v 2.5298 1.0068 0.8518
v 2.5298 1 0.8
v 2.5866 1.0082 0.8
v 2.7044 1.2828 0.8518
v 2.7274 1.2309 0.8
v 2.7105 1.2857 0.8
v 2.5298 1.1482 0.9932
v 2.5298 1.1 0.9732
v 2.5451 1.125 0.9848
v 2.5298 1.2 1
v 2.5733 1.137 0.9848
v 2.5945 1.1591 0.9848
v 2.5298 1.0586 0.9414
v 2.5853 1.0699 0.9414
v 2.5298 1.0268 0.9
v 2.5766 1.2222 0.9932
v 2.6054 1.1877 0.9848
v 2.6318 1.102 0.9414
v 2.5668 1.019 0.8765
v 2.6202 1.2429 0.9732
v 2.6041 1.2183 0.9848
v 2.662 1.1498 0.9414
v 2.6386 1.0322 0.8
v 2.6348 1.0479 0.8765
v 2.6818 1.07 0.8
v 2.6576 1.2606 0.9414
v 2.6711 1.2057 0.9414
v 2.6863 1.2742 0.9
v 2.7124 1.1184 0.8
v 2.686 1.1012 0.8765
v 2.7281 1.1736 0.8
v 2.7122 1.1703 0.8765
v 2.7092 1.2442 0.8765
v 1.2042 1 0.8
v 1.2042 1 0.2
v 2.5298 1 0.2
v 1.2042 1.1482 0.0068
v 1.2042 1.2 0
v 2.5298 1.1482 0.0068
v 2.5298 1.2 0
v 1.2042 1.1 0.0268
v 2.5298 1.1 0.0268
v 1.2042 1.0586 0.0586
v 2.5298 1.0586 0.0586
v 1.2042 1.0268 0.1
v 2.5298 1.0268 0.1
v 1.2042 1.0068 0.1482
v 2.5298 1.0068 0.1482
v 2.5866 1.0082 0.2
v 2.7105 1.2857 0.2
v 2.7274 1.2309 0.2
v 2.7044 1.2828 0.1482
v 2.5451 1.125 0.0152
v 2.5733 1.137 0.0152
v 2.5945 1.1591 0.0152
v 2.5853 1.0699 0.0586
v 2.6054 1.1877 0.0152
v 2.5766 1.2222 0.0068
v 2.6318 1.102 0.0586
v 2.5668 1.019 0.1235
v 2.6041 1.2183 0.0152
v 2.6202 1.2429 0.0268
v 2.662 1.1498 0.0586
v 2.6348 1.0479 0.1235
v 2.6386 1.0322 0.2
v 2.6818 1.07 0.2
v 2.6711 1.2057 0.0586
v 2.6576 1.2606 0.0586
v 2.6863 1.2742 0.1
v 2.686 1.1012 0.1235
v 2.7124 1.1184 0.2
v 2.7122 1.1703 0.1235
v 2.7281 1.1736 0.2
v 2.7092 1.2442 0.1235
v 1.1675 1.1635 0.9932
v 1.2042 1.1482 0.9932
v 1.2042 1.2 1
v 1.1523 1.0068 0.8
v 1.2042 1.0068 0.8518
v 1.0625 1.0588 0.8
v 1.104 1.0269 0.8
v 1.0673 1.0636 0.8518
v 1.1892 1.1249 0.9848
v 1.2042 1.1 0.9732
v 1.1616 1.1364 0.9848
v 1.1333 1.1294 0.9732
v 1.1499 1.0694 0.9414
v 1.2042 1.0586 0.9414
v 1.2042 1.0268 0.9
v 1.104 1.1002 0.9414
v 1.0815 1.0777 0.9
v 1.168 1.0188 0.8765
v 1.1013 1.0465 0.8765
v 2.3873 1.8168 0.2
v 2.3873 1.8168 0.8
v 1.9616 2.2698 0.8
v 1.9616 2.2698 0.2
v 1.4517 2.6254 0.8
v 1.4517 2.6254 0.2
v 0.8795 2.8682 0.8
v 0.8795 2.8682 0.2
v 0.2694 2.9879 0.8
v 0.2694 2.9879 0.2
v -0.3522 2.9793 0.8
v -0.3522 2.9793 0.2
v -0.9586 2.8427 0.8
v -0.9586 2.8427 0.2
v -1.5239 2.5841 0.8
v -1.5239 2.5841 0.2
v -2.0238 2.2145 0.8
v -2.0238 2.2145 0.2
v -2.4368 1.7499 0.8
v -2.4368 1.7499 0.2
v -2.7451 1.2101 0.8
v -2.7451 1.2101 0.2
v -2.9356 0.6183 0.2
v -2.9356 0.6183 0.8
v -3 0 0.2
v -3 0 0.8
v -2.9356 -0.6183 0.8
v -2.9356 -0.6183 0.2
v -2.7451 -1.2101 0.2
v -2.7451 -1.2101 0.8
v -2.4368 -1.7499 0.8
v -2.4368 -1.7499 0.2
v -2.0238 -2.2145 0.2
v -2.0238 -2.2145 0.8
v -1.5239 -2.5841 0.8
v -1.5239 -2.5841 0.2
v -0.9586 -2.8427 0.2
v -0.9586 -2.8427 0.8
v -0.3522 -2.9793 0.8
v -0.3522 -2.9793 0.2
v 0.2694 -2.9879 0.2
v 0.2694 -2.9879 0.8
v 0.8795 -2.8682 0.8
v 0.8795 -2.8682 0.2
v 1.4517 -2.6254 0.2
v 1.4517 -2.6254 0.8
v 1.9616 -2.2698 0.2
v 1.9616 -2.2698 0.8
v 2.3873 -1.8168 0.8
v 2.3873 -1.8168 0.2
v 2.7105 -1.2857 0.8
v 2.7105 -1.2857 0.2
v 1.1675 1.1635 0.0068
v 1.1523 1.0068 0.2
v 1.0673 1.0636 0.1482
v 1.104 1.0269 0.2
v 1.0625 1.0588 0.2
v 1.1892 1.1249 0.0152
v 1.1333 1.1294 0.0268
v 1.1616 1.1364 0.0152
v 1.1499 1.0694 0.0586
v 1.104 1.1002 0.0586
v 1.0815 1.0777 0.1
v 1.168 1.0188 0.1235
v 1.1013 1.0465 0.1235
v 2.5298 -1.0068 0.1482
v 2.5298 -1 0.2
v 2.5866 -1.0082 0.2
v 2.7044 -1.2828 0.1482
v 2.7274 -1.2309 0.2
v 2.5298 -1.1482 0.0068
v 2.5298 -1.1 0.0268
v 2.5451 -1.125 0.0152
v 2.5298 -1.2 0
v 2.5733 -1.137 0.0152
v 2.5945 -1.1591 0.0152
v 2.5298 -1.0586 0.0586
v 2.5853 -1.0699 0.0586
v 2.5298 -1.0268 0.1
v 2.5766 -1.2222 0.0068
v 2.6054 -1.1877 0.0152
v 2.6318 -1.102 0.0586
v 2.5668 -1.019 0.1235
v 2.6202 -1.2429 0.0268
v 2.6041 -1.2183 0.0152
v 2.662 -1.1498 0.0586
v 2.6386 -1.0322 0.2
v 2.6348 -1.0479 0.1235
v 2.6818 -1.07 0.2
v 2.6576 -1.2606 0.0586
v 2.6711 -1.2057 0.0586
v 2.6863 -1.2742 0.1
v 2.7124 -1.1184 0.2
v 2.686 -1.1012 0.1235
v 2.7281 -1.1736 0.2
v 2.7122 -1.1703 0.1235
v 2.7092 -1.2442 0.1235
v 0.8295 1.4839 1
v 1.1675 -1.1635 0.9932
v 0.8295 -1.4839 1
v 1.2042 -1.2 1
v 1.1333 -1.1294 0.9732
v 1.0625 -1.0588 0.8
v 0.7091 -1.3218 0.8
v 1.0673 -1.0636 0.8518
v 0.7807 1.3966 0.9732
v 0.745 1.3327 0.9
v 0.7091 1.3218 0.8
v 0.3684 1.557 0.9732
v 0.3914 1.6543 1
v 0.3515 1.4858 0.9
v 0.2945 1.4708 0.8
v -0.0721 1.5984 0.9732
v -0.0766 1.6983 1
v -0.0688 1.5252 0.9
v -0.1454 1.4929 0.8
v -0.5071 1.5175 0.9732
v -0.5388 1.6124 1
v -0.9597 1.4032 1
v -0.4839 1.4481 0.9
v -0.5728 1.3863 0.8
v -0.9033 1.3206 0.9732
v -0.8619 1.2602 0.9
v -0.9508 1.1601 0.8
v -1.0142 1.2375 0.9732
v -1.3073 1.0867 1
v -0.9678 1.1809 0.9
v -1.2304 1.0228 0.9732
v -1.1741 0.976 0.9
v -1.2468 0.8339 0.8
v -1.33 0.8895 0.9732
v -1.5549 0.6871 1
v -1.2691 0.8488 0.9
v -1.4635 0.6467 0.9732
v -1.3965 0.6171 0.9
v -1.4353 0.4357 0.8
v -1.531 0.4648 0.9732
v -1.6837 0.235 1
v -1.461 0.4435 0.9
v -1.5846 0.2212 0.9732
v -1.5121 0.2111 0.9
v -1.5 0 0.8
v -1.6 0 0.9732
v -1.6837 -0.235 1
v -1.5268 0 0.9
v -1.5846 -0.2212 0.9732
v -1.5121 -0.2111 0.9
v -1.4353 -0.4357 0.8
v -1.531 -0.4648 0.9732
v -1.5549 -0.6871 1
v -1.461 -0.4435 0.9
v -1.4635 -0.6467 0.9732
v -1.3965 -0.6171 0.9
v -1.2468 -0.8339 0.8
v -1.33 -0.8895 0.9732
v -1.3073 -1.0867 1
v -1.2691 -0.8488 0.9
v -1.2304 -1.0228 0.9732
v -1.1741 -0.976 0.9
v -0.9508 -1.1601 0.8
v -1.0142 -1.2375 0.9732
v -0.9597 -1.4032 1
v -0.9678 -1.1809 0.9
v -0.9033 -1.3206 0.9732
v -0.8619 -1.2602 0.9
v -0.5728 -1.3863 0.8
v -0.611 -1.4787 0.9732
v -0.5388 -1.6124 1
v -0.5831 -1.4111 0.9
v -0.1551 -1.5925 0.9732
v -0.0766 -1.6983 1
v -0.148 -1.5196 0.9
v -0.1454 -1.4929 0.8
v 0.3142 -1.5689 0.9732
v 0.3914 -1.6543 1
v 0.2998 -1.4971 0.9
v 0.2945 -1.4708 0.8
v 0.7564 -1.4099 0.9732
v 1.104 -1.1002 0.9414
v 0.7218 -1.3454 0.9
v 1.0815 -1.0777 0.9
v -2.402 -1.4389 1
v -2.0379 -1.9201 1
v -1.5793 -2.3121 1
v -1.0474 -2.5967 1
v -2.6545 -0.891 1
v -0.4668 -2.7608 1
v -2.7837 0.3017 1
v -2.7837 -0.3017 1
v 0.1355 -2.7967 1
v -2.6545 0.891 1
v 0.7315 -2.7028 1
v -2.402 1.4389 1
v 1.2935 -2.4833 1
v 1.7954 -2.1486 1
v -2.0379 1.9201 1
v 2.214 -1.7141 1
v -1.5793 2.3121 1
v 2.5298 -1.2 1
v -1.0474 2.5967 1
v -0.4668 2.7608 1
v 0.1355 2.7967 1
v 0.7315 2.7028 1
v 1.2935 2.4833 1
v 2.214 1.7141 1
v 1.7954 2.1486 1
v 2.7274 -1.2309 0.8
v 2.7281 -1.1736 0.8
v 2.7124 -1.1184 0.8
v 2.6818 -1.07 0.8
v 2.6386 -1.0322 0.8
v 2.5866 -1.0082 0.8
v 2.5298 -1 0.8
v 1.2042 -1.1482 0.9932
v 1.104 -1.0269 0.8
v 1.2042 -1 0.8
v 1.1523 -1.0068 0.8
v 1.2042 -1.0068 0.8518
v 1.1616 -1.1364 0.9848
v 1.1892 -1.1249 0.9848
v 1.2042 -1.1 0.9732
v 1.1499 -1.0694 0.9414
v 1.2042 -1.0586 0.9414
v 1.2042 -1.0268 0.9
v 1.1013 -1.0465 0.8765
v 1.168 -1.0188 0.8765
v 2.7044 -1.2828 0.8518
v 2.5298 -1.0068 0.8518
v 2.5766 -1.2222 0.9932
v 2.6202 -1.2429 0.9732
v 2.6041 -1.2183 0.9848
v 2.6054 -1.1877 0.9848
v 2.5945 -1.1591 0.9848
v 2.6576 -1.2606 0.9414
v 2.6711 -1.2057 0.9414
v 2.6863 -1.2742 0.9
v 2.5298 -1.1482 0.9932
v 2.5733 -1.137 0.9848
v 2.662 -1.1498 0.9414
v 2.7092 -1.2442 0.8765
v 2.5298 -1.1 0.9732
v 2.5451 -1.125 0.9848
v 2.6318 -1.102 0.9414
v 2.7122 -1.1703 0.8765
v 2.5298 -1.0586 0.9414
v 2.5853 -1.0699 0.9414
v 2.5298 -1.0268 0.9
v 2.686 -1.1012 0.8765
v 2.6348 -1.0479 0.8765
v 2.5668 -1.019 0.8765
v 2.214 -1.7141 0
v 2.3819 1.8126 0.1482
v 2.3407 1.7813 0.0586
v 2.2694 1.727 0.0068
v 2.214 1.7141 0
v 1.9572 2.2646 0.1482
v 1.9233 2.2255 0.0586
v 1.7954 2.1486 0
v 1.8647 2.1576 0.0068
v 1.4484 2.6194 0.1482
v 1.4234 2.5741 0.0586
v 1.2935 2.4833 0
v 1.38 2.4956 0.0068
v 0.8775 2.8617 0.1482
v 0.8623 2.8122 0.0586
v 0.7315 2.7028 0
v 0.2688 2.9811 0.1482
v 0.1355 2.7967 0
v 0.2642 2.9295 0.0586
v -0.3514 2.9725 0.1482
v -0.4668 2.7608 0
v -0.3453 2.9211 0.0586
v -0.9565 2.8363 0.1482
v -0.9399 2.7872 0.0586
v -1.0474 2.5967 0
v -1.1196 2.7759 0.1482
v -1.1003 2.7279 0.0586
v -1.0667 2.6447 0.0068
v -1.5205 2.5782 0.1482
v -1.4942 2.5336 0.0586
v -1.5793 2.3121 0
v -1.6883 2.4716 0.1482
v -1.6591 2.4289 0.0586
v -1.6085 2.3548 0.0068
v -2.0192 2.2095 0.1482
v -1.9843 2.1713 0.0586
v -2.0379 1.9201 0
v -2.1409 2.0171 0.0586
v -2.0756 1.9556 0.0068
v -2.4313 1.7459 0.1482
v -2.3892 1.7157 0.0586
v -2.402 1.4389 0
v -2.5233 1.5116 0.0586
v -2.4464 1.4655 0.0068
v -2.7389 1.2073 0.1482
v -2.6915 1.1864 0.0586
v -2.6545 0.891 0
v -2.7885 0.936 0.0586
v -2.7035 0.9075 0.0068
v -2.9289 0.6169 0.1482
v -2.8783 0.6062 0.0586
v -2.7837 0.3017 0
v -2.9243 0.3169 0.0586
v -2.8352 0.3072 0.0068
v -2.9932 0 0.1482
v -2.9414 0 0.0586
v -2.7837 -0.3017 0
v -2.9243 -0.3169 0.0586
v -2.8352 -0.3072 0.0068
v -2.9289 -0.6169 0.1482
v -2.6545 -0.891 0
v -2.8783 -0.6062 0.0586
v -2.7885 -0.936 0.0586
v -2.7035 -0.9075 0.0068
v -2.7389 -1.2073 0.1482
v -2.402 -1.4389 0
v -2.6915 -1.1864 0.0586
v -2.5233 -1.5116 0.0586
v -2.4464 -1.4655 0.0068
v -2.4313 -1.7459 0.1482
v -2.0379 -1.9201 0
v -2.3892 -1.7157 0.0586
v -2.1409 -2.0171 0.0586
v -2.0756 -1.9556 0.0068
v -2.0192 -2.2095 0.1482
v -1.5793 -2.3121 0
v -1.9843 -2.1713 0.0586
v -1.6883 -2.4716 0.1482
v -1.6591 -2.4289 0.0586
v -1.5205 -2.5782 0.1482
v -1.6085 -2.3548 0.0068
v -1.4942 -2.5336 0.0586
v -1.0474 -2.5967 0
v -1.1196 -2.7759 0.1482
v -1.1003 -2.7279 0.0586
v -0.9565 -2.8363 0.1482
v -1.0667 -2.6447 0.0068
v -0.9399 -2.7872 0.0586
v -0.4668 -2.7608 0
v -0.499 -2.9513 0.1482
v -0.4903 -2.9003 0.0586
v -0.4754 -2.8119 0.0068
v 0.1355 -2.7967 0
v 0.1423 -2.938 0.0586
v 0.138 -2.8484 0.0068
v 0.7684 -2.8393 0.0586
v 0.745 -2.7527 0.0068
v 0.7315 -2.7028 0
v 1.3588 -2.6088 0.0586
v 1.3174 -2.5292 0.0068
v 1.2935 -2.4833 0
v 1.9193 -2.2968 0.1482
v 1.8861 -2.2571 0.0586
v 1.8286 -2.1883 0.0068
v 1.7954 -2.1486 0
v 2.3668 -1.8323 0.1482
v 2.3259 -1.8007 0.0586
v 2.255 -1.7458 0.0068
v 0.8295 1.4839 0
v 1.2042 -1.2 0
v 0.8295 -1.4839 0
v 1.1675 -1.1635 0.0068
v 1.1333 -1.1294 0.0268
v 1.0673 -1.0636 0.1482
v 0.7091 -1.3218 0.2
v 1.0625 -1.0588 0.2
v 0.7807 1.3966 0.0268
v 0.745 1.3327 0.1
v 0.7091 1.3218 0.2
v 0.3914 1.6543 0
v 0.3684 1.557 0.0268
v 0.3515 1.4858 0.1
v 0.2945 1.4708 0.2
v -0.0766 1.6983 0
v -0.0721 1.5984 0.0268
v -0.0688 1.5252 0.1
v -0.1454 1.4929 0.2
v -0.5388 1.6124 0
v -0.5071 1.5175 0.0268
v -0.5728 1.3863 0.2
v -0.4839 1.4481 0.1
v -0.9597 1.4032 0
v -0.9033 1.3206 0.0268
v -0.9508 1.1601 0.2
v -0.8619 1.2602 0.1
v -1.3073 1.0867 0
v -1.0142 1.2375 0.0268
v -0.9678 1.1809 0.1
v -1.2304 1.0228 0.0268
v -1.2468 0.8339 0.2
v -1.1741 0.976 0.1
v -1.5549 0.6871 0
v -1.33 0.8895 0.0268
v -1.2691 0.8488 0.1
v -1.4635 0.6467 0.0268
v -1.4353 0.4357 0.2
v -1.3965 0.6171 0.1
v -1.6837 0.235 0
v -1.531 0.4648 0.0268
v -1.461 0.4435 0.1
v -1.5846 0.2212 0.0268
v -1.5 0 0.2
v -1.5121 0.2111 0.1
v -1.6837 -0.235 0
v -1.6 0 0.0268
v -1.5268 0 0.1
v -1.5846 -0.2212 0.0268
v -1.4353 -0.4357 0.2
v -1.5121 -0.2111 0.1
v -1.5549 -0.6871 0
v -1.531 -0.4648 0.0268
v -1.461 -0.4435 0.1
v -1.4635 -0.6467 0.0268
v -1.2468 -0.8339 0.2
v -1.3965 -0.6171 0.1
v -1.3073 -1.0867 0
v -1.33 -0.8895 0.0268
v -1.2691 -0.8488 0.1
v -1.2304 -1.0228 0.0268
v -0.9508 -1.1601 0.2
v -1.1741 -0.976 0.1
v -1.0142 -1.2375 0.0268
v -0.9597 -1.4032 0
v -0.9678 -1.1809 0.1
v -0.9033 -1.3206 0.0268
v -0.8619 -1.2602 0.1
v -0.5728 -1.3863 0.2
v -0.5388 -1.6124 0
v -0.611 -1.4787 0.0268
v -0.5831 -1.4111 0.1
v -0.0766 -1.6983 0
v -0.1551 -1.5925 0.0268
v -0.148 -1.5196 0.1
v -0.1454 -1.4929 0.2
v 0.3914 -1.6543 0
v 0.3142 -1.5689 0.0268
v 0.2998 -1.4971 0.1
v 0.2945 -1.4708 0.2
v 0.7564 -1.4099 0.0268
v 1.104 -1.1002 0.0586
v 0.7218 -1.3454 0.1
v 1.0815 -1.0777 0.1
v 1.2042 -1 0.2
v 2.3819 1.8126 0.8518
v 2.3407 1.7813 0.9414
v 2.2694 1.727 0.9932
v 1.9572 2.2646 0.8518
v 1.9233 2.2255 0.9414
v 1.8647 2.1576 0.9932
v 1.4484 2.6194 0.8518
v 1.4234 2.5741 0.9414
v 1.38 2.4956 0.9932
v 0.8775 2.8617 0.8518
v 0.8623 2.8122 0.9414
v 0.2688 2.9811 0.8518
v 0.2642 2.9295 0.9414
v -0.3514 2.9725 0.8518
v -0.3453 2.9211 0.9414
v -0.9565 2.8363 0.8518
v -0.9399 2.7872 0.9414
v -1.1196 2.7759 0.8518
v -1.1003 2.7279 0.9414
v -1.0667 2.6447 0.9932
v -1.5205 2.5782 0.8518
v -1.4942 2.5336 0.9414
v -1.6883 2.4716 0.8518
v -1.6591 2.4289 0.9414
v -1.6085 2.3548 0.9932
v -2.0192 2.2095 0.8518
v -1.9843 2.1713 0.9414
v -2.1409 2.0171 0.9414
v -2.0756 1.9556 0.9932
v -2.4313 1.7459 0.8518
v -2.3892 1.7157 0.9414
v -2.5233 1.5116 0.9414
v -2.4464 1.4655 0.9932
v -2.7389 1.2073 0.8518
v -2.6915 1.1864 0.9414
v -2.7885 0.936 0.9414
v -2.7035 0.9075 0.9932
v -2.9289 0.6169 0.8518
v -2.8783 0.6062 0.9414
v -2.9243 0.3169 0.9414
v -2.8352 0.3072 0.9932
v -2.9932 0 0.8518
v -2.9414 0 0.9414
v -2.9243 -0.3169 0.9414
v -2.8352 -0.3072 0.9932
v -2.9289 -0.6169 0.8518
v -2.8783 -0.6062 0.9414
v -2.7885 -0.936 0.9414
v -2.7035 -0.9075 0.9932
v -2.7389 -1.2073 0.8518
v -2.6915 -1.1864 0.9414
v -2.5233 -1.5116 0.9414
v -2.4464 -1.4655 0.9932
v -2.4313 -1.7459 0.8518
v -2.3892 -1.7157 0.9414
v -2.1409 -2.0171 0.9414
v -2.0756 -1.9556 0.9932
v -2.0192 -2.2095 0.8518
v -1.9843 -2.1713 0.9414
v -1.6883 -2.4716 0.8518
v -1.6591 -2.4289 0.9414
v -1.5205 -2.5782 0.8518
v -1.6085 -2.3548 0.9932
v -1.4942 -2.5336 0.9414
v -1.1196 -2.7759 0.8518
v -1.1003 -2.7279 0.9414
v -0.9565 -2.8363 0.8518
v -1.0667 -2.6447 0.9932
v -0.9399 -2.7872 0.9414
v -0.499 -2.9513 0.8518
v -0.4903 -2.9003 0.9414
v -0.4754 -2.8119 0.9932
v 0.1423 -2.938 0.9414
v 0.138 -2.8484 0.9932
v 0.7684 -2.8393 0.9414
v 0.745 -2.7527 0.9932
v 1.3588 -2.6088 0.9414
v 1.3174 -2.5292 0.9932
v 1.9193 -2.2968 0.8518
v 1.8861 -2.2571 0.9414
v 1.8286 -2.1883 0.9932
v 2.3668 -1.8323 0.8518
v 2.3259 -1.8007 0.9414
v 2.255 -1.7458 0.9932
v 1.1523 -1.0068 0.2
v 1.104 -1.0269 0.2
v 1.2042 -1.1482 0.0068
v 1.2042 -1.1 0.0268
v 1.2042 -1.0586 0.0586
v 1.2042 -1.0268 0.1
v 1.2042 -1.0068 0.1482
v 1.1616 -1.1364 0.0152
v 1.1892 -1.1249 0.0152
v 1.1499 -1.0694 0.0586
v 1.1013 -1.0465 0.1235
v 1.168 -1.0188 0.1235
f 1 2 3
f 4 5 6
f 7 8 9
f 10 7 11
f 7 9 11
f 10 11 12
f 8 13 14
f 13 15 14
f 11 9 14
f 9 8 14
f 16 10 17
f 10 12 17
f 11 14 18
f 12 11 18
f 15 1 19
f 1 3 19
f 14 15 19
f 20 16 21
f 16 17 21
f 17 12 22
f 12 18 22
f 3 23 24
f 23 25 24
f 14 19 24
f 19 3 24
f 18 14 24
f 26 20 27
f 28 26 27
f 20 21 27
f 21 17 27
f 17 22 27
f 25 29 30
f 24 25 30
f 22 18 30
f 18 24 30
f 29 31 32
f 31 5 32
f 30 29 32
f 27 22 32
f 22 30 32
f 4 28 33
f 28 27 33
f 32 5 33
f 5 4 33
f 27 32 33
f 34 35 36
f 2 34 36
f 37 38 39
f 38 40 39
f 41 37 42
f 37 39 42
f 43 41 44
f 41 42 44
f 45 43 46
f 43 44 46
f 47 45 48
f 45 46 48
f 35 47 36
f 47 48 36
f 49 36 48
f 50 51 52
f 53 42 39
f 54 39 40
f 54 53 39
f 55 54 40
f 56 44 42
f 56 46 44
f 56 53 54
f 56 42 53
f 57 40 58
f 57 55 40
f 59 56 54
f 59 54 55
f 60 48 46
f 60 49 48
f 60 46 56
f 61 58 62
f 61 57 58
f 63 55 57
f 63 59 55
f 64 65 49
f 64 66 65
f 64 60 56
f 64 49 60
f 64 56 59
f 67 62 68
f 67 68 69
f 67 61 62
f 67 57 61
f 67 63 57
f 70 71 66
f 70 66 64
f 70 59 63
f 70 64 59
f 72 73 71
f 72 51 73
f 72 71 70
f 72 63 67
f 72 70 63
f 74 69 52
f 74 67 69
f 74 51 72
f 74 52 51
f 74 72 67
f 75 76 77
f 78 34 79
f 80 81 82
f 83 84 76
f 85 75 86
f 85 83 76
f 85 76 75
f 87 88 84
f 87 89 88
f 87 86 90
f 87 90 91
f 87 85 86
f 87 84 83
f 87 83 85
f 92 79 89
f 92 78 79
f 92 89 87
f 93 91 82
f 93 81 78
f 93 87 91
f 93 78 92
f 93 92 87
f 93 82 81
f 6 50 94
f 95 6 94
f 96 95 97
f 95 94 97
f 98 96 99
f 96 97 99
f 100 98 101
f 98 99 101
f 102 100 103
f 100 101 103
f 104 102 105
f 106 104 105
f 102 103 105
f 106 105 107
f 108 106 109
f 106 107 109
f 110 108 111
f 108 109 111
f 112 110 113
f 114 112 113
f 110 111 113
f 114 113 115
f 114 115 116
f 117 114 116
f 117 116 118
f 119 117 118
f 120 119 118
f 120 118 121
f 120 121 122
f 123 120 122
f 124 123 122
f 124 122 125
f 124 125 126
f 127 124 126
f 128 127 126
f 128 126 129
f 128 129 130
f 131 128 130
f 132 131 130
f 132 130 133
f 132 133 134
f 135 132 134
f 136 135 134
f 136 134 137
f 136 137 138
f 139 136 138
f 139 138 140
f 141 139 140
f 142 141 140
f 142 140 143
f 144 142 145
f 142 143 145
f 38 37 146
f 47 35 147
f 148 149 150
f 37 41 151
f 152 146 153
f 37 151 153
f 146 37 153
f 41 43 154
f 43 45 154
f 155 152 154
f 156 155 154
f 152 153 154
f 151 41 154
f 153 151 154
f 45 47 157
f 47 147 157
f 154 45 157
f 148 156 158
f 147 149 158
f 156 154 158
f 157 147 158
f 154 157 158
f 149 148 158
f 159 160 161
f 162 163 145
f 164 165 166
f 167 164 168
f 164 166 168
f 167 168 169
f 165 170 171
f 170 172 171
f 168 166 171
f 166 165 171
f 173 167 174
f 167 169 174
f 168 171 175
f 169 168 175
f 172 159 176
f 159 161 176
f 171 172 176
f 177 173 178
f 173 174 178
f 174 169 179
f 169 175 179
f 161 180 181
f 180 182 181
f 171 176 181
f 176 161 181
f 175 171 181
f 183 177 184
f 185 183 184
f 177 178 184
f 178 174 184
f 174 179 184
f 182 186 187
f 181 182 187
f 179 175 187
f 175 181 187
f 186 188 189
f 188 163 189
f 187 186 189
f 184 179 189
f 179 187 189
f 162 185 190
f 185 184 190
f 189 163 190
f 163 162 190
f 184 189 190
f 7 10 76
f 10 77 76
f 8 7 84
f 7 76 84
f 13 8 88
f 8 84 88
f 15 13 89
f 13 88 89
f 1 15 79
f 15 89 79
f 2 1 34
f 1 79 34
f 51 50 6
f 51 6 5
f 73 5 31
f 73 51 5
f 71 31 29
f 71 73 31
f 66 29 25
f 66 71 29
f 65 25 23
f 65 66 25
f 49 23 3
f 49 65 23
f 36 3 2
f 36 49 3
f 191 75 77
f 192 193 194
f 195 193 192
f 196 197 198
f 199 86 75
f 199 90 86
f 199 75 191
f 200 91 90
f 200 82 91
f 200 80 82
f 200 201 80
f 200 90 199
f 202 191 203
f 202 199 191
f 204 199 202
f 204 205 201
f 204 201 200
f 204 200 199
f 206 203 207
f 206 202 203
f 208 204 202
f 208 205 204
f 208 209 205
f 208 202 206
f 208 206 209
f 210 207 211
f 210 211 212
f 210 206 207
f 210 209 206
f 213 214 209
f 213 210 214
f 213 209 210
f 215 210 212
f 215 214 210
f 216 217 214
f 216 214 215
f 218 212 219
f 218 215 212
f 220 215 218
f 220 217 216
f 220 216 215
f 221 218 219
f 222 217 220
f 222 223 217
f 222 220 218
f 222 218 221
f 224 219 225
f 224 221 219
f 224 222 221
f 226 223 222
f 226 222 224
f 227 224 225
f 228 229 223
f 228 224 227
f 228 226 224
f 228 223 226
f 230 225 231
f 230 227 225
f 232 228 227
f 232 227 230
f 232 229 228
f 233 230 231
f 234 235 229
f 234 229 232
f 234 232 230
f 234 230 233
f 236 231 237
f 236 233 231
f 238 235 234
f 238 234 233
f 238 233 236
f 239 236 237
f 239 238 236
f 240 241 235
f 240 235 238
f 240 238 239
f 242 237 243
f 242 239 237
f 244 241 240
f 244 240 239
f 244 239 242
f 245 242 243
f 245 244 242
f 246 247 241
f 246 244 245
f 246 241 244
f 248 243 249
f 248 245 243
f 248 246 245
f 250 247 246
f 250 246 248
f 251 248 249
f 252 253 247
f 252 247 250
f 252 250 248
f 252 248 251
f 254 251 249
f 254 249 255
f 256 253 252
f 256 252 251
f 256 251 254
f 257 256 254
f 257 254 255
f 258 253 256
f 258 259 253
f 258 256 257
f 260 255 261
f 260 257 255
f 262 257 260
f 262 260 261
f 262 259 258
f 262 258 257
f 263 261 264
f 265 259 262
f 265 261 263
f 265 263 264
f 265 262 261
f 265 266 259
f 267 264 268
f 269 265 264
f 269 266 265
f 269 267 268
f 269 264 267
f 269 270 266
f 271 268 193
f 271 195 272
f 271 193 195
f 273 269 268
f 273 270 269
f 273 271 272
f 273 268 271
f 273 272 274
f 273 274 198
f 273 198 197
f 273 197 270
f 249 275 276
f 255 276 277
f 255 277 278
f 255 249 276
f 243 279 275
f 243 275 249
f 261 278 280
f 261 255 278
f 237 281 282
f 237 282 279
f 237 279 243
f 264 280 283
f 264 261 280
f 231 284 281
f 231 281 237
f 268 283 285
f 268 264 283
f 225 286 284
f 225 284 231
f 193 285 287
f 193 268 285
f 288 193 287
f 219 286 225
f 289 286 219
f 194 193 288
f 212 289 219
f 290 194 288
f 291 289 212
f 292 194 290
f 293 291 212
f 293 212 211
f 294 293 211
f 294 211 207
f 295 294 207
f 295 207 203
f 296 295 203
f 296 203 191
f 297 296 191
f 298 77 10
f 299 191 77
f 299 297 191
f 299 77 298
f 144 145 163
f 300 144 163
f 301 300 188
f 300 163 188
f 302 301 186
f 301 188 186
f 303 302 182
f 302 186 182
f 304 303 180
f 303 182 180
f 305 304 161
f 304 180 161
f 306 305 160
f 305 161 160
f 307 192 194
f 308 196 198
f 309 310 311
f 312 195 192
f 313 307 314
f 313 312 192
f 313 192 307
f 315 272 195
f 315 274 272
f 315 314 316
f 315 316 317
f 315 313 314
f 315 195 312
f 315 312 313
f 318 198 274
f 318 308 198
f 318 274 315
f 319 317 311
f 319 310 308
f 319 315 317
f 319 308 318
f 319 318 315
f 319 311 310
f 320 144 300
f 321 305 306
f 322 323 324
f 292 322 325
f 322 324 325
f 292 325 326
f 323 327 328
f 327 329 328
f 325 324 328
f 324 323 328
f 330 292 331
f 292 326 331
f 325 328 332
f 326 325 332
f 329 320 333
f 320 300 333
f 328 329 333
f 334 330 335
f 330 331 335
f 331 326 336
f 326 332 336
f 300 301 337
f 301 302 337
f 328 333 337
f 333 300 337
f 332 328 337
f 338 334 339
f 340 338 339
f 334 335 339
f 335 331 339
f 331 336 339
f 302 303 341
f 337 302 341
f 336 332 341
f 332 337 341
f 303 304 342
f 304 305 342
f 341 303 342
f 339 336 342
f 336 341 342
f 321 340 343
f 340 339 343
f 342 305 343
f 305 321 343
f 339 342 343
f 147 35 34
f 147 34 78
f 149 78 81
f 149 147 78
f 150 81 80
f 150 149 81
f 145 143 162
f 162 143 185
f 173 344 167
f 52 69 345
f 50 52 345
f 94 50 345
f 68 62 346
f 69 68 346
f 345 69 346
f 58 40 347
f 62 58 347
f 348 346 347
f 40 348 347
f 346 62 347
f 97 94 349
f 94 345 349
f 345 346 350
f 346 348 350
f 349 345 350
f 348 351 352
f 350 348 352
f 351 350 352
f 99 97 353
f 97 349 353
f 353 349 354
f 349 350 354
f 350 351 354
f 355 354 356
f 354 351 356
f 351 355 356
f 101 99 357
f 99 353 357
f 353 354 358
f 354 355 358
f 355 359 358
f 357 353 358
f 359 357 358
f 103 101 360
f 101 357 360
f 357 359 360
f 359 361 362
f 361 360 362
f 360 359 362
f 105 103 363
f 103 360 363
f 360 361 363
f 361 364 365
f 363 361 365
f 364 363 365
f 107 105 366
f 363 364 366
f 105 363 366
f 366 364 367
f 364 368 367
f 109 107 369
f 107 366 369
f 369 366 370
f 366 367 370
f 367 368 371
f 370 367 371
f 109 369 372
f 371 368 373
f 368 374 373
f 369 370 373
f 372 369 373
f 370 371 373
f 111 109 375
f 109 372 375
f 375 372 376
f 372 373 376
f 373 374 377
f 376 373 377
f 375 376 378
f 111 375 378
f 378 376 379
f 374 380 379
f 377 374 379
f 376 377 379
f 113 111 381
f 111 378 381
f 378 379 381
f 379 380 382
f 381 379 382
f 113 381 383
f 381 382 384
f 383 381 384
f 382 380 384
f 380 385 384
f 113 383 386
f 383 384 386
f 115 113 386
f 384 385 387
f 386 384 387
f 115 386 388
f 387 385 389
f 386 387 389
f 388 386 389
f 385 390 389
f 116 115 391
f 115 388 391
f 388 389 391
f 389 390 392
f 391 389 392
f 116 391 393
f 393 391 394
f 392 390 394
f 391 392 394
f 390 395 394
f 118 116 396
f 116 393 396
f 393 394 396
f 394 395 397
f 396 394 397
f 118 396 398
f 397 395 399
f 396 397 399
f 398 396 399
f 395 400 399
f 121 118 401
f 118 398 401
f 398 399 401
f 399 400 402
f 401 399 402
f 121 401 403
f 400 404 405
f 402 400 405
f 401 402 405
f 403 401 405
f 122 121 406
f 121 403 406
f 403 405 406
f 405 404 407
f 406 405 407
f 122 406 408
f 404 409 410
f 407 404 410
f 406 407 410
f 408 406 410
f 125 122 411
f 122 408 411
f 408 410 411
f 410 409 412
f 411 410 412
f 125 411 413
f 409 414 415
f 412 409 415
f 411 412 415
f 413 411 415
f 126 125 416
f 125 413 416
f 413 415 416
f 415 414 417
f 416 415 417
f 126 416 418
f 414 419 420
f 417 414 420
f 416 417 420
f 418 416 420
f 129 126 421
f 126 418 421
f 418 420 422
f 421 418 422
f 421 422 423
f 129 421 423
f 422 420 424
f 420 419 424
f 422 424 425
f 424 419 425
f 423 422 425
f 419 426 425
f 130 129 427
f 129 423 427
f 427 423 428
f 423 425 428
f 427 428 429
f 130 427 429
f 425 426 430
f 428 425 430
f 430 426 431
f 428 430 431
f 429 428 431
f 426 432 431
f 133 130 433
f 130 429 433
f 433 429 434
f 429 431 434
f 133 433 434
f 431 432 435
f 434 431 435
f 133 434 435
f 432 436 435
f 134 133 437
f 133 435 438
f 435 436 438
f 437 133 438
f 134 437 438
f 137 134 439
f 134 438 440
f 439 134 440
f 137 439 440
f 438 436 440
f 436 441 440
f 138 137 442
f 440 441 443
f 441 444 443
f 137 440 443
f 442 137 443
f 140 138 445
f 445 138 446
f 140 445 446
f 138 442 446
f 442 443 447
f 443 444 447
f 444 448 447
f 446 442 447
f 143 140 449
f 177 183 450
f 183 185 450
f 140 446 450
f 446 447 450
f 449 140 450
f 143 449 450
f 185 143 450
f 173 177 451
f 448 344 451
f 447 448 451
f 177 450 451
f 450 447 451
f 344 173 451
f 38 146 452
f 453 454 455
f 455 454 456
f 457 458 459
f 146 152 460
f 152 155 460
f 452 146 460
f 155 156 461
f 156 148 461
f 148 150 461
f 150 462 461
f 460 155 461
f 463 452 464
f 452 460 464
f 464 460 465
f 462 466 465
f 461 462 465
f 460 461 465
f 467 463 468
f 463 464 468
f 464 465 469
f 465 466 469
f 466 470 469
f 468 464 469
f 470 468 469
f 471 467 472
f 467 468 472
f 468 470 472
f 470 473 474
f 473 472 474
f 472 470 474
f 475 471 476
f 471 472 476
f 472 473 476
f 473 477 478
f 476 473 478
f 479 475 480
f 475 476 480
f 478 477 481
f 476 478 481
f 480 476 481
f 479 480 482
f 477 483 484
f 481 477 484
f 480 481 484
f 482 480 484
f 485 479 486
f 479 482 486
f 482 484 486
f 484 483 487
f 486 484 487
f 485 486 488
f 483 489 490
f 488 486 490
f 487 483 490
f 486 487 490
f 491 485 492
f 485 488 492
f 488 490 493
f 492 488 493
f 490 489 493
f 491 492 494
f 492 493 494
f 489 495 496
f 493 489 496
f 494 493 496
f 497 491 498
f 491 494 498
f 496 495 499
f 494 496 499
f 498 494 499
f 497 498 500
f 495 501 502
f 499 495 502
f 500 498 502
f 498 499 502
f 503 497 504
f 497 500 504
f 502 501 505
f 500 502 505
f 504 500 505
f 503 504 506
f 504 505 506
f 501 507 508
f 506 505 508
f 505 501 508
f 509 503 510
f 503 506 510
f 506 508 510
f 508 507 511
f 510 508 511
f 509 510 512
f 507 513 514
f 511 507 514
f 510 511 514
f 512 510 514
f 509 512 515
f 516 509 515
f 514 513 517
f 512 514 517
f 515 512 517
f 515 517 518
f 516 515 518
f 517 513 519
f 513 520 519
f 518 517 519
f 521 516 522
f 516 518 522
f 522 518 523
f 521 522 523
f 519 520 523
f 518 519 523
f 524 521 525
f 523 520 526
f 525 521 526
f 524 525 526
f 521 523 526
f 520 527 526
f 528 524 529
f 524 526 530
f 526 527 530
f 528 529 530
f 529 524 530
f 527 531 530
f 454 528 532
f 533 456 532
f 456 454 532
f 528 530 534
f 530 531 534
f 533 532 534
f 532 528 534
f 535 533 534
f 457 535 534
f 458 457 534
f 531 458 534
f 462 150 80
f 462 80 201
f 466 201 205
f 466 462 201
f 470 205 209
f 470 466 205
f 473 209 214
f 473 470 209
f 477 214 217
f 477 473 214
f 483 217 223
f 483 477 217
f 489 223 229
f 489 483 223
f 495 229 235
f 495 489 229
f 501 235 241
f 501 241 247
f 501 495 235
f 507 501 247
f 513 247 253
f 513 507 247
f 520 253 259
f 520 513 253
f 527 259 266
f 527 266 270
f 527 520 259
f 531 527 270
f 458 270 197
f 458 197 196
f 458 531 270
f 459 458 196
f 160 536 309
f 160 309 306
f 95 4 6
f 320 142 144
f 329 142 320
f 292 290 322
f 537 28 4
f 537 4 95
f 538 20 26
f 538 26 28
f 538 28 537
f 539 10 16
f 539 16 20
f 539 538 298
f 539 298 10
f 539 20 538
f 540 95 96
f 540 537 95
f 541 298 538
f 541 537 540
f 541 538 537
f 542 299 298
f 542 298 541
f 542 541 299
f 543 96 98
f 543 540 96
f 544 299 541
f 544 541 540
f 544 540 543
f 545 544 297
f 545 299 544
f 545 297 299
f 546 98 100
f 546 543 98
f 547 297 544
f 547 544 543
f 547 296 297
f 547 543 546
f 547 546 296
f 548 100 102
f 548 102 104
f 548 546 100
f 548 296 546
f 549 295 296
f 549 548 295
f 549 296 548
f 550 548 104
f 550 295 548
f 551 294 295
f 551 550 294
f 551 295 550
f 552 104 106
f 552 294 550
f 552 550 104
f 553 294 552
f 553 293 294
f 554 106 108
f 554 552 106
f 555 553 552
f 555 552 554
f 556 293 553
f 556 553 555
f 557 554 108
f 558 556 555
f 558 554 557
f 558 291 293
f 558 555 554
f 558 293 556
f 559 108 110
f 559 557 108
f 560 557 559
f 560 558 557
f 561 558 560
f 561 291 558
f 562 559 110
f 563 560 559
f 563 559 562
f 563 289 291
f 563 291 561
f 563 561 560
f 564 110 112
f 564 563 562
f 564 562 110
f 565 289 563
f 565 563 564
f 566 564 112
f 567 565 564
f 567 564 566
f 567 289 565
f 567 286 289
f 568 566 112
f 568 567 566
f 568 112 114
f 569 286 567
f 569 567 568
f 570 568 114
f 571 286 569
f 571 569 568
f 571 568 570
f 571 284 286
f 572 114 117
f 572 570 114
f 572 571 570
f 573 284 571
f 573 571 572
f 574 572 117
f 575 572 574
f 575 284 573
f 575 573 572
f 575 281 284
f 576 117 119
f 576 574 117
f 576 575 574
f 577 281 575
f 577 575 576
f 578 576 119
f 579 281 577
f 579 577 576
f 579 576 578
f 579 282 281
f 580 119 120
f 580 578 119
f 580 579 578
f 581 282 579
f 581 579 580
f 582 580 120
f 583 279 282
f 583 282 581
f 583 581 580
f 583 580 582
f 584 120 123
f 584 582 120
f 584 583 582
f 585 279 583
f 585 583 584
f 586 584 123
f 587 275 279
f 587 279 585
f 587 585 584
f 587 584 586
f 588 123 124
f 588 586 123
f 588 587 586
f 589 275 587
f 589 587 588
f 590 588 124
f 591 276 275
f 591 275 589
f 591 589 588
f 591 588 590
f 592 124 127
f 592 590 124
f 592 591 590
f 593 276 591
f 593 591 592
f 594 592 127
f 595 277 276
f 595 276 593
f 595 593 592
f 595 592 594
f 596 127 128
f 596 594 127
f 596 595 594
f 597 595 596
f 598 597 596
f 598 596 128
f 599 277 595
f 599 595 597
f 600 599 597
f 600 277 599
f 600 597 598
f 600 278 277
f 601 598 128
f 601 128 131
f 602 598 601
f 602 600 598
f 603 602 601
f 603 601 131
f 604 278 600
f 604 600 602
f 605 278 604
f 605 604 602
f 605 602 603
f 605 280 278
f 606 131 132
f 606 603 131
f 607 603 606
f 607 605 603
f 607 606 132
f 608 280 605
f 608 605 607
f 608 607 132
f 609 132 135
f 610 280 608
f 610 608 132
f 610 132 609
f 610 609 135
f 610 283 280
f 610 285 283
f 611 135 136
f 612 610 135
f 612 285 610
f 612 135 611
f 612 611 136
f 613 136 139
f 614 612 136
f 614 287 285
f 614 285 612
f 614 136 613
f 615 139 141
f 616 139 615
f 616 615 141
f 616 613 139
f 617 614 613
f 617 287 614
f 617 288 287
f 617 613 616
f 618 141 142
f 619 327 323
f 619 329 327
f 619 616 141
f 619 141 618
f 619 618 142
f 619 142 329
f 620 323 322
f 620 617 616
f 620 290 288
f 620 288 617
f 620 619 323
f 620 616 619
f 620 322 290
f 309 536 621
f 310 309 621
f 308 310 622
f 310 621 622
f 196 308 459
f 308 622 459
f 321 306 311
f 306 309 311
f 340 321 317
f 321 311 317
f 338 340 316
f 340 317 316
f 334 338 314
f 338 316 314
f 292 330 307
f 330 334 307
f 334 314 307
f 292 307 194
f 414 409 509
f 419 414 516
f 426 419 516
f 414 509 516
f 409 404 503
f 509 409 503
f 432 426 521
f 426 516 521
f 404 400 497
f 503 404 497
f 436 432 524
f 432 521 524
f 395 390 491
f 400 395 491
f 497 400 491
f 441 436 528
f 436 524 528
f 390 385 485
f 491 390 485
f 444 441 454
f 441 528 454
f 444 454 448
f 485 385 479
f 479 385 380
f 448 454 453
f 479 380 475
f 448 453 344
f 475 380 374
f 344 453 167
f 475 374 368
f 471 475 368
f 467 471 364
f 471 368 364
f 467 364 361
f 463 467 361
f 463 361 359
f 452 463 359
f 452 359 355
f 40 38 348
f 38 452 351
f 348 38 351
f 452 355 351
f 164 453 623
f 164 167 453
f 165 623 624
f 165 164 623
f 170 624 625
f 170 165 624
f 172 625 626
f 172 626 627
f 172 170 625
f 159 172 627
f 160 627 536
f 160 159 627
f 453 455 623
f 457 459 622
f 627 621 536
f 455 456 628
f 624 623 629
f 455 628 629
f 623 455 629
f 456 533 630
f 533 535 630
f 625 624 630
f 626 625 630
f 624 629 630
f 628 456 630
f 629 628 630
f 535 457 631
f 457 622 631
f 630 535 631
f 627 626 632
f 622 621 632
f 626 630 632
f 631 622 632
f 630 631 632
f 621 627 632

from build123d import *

# Parameters (mm, degrees)
BOX_W             = 3
BOX_H             = 2
BOX_DEPTH         = 10
CYLINDER_R        = 1.5
CYLINDER_DEPTH    = 1
CYLINDER001_R     = 3
CYLINDER001_DEPTH = 1
FILLET_R          = 0.2


with BuildPart() as cube:
    # Box → Box (new body)
    with BuildSketch(Plane(origin=(0, -1, 0), x_dir=(1, 0, 0), z_dir=(0, 0, 1))):
        with Locations((1.5, 1)):
            Rectangle(BOX_W, BOX_H)
    extrude(amount=BOX_DEPTH)


with BuildPart() as cylinder:
    # Cylinder → Cylinder (new body)
    with BuildSketch(Plane.XY):
        Circle(CYLINDER_R)
    extrude(amount=CYLINDER_DEPTH)


with BuildPart() as seegerring3mm:
    # Cylinder001 → Cylinder001 (new body)
    with BuildSketch(Plane.XY):
        Circle(CYLINDER001_R)
    extrude(amount=CYLINDER001_DEPTH)

    # Cut: cut Cylinder
    add(cylinder.part, mode=Mode.SUBTRACT)

    # Cut001: cut Cube
    add(cube.part, mode=Mode.SUBTRACT)

    # Fillet
    fillet_edges = [seegerring3mm.edges().sort_by_distance(p)[0] for p in [
        (-3, 0, 0),
        (2.828427, -1, 0.5),
        (-3, 0, 1),
        (2.828427, 1, 0.5),
        (1.973231, 1, 0),
        (-1.5, 0, 0),
        (1.973231, -1, 0),
        (1.973231, -1, 1),
        (1.118034, -1, 0.5),
        (1.973231, 1, 1),
        (-1.5, 0, 1),
        (1.118034, 1, 0.5),
    ]]
    fillet(fillet_edges, radius=FILLET_R)


solid = seegerring3mm.part
